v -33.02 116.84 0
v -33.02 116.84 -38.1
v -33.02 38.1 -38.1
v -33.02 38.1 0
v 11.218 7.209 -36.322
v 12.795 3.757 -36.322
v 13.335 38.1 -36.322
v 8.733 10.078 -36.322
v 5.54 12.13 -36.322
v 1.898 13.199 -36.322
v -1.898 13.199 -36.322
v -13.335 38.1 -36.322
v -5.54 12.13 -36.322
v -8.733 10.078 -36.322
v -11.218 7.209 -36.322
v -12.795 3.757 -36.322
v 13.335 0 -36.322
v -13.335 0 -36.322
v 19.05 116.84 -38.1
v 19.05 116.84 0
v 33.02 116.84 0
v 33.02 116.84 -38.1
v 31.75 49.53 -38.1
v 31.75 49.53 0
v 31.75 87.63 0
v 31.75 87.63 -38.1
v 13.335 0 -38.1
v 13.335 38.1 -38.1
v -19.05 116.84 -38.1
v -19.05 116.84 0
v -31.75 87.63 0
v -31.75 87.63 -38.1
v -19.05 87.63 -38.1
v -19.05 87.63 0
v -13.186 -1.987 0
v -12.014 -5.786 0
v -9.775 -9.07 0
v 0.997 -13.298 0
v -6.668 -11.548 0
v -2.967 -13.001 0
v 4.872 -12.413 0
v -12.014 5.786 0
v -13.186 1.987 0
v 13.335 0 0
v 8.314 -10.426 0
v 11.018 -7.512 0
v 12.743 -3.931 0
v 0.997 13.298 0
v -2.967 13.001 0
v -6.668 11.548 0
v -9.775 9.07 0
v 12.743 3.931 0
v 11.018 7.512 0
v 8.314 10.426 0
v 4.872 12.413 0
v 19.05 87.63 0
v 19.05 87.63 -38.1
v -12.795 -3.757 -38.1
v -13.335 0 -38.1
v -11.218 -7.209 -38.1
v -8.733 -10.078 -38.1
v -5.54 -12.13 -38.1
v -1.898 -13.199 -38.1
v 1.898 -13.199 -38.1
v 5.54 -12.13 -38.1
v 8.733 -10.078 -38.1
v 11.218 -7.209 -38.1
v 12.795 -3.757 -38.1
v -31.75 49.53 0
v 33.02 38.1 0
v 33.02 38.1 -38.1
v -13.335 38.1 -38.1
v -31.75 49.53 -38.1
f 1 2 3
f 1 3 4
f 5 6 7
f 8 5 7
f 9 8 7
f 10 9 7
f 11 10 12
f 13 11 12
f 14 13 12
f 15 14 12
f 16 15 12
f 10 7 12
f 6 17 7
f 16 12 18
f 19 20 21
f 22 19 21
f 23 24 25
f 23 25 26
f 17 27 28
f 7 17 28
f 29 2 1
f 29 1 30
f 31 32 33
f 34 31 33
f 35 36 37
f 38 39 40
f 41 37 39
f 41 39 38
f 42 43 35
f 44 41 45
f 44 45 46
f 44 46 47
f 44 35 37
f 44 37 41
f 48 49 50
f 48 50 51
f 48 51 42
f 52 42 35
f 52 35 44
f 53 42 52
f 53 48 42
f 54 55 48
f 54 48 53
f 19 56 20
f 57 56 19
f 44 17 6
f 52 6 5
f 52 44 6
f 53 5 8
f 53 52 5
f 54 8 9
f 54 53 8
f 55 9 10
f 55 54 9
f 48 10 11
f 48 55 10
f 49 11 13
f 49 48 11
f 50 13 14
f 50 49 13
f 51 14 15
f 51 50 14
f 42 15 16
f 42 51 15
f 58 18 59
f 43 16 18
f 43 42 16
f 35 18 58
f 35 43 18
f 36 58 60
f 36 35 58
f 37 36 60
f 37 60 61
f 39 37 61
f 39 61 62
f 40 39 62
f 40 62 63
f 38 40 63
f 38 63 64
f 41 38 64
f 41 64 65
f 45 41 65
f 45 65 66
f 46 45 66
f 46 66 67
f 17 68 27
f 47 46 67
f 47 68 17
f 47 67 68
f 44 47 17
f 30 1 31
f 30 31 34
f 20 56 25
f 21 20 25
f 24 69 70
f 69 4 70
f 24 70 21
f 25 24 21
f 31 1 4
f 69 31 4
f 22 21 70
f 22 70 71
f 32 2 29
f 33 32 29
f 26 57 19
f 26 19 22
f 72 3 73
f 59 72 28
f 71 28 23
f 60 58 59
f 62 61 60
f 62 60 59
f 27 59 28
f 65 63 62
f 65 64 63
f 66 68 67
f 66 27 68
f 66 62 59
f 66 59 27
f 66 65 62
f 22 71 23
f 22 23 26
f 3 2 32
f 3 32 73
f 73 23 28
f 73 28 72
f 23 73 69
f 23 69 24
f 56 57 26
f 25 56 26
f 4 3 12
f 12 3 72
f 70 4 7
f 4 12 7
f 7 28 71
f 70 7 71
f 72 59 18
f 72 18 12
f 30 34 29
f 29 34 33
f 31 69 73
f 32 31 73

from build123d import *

# Parameters (mm, degrees)
SKETCH1_R           = 13.335
FEATUREA_DEPTH      = 38.1
SKETCH2_W           = 26.67
SKETCH2_H           = 38.1
FEATUREB_DEPTH      = 1.778
FEATUREC_DEPTH      = 11.43
SKETCH4_W           = 1.27
SKETCH4_H           = 38.1
FEATURED_DEPTH      = 38.1
SKETCH7_W           = 13.97
SKETCH7_H           = 38.1
BOSS_EXTRUDE5_DEPTH = 29.21


with BuildPart() as part:
    # Sketch1 → FeatureA (new body)
    with BuildSketch(Plane.XY):
        Circle(SKETCH1_R)
    extrude(amount=-FEATUREA_DEPTH)

    # Sketch2 → FeatureB (add)
    with BuildSketch(Plane(origin=(0, 0, -38.1), x_dir=(-1, 0, 0), z_dir=(0, 0, -1))):
        with Locations((0, 19.05)):
            Rectangle(SKETCH2_W, SKETCH2_H)
    extrude(amount=-FEATUREB_DEPTH)

    # Sketch3 → FeatureC (add)
    with BuildSketch(Plane(origin=(0, 38.1, 0), x_dir=(1, 0, 0), z_dir=(0, 1, 0))):
        Polygon((0, 38.1), (-33.02, 38.1), (-33.02, 0), (33.02, 0), (33.02, 38.1), align=None)
    extrude(amount=FEATUREC_DEPTH)

    # Sketch4 → FeatureD (add)
    with BuildSketch(Plane(origin=(0, 49.53, 0), x_dir=(1, 0, 0), z_dir=(0, 1, 0))):
        with Locations((32.385, 19.05)):
            Rectangle(SKETCH4_W, SKETCH4_H)
        with Locations((-32.385, 19.05)):
            Rectangle(SKETCH4_W, SKETCH4_H)
    extrude(amount=FEATURED_DEPTH)

    # Sketch7 → Boss-Extrude5 (add)
    with BuildSketch(Plane(origin=(0, 87.63, 0), x_dir=(1, 0, 0), z_dir=(0, 1, 0))):
        with Locations((26.035, 19.05)):
            Rectangle(SKETCH7_W, SKETCH7_H)
        with Locations((-26.035, 19.05)):
            Rectangle(SKETCH7_W, SKETCH7_H)
    extrude(amount=BOSS_EXTRUDE5_DEPTH)


solid = part.part
